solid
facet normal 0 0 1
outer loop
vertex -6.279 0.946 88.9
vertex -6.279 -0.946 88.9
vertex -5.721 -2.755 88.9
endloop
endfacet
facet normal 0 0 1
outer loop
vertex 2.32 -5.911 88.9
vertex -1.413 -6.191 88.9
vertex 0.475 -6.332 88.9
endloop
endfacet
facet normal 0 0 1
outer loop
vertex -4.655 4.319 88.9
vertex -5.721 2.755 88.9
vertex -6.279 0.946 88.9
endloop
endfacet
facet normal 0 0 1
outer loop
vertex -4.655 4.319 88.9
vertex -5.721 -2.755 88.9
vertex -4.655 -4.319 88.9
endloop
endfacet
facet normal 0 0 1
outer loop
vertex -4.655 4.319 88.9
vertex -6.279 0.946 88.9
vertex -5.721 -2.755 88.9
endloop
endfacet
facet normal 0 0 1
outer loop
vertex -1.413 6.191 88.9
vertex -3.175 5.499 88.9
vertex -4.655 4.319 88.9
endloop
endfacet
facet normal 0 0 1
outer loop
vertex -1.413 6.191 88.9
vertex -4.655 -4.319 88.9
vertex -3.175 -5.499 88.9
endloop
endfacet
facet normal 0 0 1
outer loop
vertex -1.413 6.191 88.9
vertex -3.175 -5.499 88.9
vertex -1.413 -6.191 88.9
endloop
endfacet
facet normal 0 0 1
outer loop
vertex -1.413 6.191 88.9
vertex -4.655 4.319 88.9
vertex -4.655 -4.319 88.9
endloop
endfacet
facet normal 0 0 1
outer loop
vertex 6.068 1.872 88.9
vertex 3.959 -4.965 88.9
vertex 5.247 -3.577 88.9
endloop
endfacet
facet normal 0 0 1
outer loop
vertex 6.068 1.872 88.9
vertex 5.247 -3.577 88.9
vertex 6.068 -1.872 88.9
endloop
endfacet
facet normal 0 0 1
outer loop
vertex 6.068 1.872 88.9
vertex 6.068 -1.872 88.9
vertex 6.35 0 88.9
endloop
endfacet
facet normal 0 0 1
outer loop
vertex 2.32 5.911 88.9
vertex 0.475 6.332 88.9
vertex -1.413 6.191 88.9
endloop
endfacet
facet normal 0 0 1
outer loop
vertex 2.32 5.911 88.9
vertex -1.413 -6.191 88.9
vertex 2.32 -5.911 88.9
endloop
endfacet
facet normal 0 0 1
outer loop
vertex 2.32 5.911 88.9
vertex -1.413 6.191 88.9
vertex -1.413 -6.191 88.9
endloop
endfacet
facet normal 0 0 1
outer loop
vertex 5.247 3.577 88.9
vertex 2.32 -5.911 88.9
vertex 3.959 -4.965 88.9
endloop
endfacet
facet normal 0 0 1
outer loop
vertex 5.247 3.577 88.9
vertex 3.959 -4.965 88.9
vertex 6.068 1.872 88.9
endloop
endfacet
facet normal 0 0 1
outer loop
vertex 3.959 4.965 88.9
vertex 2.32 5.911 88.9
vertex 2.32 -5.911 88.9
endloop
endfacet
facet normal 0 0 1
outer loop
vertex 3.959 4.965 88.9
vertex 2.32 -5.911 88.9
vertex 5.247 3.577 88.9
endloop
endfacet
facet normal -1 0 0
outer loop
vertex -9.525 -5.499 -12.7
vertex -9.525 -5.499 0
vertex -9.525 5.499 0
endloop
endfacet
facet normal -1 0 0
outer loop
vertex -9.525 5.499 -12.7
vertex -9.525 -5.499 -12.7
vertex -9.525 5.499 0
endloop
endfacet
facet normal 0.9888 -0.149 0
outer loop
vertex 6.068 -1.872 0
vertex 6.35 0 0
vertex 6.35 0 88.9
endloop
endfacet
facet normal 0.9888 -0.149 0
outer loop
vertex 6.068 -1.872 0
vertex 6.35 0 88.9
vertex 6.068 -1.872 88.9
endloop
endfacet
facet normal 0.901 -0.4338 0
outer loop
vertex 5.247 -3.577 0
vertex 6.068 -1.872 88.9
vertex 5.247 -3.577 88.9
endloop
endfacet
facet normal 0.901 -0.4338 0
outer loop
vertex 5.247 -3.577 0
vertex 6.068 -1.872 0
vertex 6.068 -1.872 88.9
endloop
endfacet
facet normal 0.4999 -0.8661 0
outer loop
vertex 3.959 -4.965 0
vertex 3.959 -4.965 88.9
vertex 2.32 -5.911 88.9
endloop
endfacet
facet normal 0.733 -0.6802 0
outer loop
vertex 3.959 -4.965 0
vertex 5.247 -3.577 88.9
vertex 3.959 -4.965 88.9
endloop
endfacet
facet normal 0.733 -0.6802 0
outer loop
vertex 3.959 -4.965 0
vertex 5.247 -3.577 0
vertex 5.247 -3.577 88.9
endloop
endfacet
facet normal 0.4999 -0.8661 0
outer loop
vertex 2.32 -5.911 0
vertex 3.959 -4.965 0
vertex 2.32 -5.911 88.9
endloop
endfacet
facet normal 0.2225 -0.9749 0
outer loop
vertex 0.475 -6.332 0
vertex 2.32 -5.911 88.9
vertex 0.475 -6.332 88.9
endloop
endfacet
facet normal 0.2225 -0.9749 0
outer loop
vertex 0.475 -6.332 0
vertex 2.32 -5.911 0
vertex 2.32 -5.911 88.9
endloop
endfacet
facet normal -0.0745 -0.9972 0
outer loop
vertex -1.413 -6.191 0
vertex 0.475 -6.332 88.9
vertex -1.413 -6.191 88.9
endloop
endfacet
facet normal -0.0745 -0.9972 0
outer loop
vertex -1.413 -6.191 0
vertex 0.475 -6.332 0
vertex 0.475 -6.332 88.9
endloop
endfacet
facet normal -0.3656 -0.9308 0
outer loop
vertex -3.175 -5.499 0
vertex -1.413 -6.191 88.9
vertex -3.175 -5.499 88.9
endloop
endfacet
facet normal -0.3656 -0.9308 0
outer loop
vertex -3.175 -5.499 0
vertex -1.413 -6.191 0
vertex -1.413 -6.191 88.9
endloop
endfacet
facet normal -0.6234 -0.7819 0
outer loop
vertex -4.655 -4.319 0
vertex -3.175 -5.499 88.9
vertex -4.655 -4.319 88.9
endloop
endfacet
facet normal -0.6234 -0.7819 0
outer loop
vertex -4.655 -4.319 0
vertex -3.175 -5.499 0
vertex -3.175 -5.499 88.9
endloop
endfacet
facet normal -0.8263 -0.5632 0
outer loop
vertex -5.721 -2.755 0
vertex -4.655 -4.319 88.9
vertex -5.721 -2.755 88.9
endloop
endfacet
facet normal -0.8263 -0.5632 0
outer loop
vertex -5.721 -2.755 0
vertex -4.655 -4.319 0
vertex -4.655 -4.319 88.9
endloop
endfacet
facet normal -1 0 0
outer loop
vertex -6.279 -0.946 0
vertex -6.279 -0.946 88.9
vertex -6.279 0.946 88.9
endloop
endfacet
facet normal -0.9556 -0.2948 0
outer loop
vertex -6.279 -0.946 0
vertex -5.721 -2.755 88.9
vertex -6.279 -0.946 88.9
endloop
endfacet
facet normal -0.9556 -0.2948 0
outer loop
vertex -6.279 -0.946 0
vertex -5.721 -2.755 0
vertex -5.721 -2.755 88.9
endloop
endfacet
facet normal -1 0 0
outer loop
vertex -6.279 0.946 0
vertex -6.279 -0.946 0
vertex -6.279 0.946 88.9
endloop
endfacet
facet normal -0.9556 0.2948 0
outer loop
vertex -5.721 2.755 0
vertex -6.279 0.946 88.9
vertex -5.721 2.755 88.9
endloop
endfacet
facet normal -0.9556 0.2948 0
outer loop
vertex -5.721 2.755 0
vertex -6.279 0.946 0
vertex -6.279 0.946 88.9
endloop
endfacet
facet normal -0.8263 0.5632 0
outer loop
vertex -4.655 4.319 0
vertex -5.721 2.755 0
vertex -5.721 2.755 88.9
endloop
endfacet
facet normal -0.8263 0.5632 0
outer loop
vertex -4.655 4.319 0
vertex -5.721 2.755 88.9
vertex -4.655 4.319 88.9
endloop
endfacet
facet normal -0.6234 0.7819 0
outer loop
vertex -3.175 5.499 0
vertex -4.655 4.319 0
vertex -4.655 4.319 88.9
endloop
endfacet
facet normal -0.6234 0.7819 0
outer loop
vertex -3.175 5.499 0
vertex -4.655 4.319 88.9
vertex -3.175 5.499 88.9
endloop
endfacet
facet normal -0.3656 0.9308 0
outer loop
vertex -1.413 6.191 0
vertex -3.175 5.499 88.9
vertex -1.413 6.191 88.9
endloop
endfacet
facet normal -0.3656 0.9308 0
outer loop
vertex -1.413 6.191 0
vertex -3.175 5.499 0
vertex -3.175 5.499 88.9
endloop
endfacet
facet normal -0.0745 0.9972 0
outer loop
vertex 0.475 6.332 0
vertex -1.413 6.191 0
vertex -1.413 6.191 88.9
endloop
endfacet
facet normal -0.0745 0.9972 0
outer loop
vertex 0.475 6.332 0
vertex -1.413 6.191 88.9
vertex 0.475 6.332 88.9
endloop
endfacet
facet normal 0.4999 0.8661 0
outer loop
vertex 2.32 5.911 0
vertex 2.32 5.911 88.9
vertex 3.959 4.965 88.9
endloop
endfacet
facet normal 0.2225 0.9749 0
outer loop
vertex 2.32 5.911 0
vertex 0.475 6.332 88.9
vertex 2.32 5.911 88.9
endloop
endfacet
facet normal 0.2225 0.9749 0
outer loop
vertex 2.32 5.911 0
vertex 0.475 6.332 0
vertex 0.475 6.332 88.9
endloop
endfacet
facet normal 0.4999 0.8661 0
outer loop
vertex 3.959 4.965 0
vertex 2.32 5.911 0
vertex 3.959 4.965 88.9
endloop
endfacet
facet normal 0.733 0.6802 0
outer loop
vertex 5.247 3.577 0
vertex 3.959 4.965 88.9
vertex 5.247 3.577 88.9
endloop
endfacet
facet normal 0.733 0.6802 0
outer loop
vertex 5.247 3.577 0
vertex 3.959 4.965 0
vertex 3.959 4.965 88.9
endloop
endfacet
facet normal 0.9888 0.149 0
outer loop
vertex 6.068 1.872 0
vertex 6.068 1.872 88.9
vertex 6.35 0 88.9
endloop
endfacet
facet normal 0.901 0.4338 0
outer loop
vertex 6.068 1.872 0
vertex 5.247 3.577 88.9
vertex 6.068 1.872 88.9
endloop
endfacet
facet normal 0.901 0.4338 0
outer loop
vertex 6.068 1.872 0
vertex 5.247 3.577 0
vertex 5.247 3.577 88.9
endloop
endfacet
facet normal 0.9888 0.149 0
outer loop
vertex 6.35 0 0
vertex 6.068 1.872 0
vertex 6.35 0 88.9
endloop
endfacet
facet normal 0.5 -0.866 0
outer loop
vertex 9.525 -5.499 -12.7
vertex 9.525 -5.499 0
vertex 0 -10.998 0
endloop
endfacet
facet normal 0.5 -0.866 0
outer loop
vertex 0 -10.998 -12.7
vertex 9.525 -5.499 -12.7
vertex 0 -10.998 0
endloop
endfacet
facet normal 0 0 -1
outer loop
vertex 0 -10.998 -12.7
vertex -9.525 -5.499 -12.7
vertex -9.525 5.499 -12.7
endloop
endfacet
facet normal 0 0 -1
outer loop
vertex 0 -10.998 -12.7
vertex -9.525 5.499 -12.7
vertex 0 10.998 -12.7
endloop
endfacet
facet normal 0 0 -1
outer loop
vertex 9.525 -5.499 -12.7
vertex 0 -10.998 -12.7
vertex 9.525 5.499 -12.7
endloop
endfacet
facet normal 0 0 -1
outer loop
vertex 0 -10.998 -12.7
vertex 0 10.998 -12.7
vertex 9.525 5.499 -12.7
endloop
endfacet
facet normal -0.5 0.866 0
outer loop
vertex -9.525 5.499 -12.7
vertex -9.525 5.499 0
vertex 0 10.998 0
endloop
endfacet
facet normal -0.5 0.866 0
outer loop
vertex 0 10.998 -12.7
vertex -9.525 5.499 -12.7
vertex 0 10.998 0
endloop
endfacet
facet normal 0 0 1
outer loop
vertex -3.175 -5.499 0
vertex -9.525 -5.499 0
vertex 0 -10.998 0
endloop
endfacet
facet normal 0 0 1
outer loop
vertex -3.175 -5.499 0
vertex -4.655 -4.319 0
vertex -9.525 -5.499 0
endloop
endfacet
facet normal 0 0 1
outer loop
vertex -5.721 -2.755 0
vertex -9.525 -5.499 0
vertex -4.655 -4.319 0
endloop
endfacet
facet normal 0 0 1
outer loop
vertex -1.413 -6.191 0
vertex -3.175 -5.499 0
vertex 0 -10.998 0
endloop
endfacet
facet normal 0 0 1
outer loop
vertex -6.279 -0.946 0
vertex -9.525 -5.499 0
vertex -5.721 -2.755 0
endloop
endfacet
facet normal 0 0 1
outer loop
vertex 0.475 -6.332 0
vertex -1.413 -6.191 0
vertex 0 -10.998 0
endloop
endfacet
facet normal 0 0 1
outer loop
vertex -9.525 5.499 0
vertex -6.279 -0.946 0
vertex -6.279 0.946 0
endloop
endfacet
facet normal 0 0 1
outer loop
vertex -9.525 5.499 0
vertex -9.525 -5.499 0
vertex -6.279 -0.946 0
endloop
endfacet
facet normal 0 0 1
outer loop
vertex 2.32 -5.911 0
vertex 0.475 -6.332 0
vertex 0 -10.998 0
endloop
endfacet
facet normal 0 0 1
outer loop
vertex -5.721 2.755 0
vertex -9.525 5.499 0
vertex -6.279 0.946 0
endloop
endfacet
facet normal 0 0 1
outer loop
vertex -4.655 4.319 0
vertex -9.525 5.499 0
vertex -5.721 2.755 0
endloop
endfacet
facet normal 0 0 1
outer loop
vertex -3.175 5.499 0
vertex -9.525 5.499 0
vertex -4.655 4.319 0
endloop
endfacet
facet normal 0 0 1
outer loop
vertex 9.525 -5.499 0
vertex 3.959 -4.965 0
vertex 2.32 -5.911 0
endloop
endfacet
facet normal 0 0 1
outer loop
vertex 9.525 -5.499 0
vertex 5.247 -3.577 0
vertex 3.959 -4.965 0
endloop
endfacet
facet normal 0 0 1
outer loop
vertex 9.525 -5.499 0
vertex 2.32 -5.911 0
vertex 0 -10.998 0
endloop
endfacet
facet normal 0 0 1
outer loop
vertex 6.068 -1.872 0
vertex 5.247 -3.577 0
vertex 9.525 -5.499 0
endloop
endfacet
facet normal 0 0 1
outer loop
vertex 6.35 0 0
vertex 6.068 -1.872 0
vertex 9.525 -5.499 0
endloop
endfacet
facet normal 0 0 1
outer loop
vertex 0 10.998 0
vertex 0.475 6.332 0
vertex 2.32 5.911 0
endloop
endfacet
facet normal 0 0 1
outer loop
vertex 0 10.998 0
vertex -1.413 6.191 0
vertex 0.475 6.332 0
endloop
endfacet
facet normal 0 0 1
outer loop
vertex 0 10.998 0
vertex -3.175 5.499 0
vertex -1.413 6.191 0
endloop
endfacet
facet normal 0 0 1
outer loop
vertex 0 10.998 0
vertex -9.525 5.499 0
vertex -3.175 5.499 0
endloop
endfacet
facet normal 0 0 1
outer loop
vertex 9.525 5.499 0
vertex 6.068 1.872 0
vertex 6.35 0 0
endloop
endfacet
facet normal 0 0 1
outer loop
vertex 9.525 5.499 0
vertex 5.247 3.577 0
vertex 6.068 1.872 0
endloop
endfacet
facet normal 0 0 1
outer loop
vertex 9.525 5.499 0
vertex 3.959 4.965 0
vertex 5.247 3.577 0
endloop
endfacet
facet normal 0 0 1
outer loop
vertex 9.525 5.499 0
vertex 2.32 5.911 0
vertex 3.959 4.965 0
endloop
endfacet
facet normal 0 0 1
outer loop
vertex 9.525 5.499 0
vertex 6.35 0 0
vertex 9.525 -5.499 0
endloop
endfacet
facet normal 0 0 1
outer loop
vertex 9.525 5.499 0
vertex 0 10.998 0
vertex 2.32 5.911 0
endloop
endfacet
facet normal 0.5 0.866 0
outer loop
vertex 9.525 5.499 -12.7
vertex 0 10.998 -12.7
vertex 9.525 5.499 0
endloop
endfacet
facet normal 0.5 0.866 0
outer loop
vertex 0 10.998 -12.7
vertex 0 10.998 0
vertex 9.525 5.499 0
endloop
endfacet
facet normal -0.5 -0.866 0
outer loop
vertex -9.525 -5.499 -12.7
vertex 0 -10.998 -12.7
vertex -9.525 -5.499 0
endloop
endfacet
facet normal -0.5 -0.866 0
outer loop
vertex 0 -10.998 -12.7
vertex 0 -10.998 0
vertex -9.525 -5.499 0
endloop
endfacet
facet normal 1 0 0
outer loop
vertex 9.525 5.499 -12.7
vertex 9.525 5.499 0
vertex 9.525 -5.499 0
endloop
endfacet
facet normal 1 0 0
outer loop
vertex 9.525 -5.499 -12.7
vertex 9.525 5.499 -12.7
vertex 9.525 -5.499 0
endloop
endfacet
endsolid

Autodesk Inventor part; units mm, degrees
ref_plane "YZ Plane" through (0, 0, 0) normal (1, 0, 0) x (0, 1, 0)
ref_plane "XZ Plane" through (0, 0, 0) normal (0, 1, 0) x (-1, 0, 0)
ref_plane "XY Plane" through (0, 0, 0) normal (0, 0, 1) x (1, 0, 0)
sketch "Sketch1" plane through (0, 0, 0) normal (0, 0, 1) x (1, 0, 0)
  circle A0 centre (0, 0) radius 6.35
  line L0 (0, 10.9985) -> (9.525, 5.4993)
  line L1 (9.525, 5.4993) -> (9.525, -5.4993)
  line L2 (9.525, -5.4993) -> (0, -10.9985)
  line L3 (0, -10.9985) -> (-9.525, -5.4993)
  line L4 (-9.525, -5.4993) -> (-9.525, 5.4993)
  line L5 (-9.525, 5.4993) -> (0, 10.9985)
  dimension "d1" = 19.05
extrude "Extrusion1" add sketch "Sketch1" against normal blind 12.7 contours A0 | L0 L1 L2 L3 L4 L5
sketch "Sketch2" plane through (0, 0, 0) normal (0, 0, 1) x (1, 0, 0)
  circle A0 centre (0, 0) radius 6.35
  dimension "d4" = 12.7
extrude "Extrusion2" add sketch "Sketch2" along normal blind 88.9
thread "Thread1" size "1/2-13 UNC" class "2A" standard "ANSI Unified Screw Threads" full length
properties part number "4 in bolt"
